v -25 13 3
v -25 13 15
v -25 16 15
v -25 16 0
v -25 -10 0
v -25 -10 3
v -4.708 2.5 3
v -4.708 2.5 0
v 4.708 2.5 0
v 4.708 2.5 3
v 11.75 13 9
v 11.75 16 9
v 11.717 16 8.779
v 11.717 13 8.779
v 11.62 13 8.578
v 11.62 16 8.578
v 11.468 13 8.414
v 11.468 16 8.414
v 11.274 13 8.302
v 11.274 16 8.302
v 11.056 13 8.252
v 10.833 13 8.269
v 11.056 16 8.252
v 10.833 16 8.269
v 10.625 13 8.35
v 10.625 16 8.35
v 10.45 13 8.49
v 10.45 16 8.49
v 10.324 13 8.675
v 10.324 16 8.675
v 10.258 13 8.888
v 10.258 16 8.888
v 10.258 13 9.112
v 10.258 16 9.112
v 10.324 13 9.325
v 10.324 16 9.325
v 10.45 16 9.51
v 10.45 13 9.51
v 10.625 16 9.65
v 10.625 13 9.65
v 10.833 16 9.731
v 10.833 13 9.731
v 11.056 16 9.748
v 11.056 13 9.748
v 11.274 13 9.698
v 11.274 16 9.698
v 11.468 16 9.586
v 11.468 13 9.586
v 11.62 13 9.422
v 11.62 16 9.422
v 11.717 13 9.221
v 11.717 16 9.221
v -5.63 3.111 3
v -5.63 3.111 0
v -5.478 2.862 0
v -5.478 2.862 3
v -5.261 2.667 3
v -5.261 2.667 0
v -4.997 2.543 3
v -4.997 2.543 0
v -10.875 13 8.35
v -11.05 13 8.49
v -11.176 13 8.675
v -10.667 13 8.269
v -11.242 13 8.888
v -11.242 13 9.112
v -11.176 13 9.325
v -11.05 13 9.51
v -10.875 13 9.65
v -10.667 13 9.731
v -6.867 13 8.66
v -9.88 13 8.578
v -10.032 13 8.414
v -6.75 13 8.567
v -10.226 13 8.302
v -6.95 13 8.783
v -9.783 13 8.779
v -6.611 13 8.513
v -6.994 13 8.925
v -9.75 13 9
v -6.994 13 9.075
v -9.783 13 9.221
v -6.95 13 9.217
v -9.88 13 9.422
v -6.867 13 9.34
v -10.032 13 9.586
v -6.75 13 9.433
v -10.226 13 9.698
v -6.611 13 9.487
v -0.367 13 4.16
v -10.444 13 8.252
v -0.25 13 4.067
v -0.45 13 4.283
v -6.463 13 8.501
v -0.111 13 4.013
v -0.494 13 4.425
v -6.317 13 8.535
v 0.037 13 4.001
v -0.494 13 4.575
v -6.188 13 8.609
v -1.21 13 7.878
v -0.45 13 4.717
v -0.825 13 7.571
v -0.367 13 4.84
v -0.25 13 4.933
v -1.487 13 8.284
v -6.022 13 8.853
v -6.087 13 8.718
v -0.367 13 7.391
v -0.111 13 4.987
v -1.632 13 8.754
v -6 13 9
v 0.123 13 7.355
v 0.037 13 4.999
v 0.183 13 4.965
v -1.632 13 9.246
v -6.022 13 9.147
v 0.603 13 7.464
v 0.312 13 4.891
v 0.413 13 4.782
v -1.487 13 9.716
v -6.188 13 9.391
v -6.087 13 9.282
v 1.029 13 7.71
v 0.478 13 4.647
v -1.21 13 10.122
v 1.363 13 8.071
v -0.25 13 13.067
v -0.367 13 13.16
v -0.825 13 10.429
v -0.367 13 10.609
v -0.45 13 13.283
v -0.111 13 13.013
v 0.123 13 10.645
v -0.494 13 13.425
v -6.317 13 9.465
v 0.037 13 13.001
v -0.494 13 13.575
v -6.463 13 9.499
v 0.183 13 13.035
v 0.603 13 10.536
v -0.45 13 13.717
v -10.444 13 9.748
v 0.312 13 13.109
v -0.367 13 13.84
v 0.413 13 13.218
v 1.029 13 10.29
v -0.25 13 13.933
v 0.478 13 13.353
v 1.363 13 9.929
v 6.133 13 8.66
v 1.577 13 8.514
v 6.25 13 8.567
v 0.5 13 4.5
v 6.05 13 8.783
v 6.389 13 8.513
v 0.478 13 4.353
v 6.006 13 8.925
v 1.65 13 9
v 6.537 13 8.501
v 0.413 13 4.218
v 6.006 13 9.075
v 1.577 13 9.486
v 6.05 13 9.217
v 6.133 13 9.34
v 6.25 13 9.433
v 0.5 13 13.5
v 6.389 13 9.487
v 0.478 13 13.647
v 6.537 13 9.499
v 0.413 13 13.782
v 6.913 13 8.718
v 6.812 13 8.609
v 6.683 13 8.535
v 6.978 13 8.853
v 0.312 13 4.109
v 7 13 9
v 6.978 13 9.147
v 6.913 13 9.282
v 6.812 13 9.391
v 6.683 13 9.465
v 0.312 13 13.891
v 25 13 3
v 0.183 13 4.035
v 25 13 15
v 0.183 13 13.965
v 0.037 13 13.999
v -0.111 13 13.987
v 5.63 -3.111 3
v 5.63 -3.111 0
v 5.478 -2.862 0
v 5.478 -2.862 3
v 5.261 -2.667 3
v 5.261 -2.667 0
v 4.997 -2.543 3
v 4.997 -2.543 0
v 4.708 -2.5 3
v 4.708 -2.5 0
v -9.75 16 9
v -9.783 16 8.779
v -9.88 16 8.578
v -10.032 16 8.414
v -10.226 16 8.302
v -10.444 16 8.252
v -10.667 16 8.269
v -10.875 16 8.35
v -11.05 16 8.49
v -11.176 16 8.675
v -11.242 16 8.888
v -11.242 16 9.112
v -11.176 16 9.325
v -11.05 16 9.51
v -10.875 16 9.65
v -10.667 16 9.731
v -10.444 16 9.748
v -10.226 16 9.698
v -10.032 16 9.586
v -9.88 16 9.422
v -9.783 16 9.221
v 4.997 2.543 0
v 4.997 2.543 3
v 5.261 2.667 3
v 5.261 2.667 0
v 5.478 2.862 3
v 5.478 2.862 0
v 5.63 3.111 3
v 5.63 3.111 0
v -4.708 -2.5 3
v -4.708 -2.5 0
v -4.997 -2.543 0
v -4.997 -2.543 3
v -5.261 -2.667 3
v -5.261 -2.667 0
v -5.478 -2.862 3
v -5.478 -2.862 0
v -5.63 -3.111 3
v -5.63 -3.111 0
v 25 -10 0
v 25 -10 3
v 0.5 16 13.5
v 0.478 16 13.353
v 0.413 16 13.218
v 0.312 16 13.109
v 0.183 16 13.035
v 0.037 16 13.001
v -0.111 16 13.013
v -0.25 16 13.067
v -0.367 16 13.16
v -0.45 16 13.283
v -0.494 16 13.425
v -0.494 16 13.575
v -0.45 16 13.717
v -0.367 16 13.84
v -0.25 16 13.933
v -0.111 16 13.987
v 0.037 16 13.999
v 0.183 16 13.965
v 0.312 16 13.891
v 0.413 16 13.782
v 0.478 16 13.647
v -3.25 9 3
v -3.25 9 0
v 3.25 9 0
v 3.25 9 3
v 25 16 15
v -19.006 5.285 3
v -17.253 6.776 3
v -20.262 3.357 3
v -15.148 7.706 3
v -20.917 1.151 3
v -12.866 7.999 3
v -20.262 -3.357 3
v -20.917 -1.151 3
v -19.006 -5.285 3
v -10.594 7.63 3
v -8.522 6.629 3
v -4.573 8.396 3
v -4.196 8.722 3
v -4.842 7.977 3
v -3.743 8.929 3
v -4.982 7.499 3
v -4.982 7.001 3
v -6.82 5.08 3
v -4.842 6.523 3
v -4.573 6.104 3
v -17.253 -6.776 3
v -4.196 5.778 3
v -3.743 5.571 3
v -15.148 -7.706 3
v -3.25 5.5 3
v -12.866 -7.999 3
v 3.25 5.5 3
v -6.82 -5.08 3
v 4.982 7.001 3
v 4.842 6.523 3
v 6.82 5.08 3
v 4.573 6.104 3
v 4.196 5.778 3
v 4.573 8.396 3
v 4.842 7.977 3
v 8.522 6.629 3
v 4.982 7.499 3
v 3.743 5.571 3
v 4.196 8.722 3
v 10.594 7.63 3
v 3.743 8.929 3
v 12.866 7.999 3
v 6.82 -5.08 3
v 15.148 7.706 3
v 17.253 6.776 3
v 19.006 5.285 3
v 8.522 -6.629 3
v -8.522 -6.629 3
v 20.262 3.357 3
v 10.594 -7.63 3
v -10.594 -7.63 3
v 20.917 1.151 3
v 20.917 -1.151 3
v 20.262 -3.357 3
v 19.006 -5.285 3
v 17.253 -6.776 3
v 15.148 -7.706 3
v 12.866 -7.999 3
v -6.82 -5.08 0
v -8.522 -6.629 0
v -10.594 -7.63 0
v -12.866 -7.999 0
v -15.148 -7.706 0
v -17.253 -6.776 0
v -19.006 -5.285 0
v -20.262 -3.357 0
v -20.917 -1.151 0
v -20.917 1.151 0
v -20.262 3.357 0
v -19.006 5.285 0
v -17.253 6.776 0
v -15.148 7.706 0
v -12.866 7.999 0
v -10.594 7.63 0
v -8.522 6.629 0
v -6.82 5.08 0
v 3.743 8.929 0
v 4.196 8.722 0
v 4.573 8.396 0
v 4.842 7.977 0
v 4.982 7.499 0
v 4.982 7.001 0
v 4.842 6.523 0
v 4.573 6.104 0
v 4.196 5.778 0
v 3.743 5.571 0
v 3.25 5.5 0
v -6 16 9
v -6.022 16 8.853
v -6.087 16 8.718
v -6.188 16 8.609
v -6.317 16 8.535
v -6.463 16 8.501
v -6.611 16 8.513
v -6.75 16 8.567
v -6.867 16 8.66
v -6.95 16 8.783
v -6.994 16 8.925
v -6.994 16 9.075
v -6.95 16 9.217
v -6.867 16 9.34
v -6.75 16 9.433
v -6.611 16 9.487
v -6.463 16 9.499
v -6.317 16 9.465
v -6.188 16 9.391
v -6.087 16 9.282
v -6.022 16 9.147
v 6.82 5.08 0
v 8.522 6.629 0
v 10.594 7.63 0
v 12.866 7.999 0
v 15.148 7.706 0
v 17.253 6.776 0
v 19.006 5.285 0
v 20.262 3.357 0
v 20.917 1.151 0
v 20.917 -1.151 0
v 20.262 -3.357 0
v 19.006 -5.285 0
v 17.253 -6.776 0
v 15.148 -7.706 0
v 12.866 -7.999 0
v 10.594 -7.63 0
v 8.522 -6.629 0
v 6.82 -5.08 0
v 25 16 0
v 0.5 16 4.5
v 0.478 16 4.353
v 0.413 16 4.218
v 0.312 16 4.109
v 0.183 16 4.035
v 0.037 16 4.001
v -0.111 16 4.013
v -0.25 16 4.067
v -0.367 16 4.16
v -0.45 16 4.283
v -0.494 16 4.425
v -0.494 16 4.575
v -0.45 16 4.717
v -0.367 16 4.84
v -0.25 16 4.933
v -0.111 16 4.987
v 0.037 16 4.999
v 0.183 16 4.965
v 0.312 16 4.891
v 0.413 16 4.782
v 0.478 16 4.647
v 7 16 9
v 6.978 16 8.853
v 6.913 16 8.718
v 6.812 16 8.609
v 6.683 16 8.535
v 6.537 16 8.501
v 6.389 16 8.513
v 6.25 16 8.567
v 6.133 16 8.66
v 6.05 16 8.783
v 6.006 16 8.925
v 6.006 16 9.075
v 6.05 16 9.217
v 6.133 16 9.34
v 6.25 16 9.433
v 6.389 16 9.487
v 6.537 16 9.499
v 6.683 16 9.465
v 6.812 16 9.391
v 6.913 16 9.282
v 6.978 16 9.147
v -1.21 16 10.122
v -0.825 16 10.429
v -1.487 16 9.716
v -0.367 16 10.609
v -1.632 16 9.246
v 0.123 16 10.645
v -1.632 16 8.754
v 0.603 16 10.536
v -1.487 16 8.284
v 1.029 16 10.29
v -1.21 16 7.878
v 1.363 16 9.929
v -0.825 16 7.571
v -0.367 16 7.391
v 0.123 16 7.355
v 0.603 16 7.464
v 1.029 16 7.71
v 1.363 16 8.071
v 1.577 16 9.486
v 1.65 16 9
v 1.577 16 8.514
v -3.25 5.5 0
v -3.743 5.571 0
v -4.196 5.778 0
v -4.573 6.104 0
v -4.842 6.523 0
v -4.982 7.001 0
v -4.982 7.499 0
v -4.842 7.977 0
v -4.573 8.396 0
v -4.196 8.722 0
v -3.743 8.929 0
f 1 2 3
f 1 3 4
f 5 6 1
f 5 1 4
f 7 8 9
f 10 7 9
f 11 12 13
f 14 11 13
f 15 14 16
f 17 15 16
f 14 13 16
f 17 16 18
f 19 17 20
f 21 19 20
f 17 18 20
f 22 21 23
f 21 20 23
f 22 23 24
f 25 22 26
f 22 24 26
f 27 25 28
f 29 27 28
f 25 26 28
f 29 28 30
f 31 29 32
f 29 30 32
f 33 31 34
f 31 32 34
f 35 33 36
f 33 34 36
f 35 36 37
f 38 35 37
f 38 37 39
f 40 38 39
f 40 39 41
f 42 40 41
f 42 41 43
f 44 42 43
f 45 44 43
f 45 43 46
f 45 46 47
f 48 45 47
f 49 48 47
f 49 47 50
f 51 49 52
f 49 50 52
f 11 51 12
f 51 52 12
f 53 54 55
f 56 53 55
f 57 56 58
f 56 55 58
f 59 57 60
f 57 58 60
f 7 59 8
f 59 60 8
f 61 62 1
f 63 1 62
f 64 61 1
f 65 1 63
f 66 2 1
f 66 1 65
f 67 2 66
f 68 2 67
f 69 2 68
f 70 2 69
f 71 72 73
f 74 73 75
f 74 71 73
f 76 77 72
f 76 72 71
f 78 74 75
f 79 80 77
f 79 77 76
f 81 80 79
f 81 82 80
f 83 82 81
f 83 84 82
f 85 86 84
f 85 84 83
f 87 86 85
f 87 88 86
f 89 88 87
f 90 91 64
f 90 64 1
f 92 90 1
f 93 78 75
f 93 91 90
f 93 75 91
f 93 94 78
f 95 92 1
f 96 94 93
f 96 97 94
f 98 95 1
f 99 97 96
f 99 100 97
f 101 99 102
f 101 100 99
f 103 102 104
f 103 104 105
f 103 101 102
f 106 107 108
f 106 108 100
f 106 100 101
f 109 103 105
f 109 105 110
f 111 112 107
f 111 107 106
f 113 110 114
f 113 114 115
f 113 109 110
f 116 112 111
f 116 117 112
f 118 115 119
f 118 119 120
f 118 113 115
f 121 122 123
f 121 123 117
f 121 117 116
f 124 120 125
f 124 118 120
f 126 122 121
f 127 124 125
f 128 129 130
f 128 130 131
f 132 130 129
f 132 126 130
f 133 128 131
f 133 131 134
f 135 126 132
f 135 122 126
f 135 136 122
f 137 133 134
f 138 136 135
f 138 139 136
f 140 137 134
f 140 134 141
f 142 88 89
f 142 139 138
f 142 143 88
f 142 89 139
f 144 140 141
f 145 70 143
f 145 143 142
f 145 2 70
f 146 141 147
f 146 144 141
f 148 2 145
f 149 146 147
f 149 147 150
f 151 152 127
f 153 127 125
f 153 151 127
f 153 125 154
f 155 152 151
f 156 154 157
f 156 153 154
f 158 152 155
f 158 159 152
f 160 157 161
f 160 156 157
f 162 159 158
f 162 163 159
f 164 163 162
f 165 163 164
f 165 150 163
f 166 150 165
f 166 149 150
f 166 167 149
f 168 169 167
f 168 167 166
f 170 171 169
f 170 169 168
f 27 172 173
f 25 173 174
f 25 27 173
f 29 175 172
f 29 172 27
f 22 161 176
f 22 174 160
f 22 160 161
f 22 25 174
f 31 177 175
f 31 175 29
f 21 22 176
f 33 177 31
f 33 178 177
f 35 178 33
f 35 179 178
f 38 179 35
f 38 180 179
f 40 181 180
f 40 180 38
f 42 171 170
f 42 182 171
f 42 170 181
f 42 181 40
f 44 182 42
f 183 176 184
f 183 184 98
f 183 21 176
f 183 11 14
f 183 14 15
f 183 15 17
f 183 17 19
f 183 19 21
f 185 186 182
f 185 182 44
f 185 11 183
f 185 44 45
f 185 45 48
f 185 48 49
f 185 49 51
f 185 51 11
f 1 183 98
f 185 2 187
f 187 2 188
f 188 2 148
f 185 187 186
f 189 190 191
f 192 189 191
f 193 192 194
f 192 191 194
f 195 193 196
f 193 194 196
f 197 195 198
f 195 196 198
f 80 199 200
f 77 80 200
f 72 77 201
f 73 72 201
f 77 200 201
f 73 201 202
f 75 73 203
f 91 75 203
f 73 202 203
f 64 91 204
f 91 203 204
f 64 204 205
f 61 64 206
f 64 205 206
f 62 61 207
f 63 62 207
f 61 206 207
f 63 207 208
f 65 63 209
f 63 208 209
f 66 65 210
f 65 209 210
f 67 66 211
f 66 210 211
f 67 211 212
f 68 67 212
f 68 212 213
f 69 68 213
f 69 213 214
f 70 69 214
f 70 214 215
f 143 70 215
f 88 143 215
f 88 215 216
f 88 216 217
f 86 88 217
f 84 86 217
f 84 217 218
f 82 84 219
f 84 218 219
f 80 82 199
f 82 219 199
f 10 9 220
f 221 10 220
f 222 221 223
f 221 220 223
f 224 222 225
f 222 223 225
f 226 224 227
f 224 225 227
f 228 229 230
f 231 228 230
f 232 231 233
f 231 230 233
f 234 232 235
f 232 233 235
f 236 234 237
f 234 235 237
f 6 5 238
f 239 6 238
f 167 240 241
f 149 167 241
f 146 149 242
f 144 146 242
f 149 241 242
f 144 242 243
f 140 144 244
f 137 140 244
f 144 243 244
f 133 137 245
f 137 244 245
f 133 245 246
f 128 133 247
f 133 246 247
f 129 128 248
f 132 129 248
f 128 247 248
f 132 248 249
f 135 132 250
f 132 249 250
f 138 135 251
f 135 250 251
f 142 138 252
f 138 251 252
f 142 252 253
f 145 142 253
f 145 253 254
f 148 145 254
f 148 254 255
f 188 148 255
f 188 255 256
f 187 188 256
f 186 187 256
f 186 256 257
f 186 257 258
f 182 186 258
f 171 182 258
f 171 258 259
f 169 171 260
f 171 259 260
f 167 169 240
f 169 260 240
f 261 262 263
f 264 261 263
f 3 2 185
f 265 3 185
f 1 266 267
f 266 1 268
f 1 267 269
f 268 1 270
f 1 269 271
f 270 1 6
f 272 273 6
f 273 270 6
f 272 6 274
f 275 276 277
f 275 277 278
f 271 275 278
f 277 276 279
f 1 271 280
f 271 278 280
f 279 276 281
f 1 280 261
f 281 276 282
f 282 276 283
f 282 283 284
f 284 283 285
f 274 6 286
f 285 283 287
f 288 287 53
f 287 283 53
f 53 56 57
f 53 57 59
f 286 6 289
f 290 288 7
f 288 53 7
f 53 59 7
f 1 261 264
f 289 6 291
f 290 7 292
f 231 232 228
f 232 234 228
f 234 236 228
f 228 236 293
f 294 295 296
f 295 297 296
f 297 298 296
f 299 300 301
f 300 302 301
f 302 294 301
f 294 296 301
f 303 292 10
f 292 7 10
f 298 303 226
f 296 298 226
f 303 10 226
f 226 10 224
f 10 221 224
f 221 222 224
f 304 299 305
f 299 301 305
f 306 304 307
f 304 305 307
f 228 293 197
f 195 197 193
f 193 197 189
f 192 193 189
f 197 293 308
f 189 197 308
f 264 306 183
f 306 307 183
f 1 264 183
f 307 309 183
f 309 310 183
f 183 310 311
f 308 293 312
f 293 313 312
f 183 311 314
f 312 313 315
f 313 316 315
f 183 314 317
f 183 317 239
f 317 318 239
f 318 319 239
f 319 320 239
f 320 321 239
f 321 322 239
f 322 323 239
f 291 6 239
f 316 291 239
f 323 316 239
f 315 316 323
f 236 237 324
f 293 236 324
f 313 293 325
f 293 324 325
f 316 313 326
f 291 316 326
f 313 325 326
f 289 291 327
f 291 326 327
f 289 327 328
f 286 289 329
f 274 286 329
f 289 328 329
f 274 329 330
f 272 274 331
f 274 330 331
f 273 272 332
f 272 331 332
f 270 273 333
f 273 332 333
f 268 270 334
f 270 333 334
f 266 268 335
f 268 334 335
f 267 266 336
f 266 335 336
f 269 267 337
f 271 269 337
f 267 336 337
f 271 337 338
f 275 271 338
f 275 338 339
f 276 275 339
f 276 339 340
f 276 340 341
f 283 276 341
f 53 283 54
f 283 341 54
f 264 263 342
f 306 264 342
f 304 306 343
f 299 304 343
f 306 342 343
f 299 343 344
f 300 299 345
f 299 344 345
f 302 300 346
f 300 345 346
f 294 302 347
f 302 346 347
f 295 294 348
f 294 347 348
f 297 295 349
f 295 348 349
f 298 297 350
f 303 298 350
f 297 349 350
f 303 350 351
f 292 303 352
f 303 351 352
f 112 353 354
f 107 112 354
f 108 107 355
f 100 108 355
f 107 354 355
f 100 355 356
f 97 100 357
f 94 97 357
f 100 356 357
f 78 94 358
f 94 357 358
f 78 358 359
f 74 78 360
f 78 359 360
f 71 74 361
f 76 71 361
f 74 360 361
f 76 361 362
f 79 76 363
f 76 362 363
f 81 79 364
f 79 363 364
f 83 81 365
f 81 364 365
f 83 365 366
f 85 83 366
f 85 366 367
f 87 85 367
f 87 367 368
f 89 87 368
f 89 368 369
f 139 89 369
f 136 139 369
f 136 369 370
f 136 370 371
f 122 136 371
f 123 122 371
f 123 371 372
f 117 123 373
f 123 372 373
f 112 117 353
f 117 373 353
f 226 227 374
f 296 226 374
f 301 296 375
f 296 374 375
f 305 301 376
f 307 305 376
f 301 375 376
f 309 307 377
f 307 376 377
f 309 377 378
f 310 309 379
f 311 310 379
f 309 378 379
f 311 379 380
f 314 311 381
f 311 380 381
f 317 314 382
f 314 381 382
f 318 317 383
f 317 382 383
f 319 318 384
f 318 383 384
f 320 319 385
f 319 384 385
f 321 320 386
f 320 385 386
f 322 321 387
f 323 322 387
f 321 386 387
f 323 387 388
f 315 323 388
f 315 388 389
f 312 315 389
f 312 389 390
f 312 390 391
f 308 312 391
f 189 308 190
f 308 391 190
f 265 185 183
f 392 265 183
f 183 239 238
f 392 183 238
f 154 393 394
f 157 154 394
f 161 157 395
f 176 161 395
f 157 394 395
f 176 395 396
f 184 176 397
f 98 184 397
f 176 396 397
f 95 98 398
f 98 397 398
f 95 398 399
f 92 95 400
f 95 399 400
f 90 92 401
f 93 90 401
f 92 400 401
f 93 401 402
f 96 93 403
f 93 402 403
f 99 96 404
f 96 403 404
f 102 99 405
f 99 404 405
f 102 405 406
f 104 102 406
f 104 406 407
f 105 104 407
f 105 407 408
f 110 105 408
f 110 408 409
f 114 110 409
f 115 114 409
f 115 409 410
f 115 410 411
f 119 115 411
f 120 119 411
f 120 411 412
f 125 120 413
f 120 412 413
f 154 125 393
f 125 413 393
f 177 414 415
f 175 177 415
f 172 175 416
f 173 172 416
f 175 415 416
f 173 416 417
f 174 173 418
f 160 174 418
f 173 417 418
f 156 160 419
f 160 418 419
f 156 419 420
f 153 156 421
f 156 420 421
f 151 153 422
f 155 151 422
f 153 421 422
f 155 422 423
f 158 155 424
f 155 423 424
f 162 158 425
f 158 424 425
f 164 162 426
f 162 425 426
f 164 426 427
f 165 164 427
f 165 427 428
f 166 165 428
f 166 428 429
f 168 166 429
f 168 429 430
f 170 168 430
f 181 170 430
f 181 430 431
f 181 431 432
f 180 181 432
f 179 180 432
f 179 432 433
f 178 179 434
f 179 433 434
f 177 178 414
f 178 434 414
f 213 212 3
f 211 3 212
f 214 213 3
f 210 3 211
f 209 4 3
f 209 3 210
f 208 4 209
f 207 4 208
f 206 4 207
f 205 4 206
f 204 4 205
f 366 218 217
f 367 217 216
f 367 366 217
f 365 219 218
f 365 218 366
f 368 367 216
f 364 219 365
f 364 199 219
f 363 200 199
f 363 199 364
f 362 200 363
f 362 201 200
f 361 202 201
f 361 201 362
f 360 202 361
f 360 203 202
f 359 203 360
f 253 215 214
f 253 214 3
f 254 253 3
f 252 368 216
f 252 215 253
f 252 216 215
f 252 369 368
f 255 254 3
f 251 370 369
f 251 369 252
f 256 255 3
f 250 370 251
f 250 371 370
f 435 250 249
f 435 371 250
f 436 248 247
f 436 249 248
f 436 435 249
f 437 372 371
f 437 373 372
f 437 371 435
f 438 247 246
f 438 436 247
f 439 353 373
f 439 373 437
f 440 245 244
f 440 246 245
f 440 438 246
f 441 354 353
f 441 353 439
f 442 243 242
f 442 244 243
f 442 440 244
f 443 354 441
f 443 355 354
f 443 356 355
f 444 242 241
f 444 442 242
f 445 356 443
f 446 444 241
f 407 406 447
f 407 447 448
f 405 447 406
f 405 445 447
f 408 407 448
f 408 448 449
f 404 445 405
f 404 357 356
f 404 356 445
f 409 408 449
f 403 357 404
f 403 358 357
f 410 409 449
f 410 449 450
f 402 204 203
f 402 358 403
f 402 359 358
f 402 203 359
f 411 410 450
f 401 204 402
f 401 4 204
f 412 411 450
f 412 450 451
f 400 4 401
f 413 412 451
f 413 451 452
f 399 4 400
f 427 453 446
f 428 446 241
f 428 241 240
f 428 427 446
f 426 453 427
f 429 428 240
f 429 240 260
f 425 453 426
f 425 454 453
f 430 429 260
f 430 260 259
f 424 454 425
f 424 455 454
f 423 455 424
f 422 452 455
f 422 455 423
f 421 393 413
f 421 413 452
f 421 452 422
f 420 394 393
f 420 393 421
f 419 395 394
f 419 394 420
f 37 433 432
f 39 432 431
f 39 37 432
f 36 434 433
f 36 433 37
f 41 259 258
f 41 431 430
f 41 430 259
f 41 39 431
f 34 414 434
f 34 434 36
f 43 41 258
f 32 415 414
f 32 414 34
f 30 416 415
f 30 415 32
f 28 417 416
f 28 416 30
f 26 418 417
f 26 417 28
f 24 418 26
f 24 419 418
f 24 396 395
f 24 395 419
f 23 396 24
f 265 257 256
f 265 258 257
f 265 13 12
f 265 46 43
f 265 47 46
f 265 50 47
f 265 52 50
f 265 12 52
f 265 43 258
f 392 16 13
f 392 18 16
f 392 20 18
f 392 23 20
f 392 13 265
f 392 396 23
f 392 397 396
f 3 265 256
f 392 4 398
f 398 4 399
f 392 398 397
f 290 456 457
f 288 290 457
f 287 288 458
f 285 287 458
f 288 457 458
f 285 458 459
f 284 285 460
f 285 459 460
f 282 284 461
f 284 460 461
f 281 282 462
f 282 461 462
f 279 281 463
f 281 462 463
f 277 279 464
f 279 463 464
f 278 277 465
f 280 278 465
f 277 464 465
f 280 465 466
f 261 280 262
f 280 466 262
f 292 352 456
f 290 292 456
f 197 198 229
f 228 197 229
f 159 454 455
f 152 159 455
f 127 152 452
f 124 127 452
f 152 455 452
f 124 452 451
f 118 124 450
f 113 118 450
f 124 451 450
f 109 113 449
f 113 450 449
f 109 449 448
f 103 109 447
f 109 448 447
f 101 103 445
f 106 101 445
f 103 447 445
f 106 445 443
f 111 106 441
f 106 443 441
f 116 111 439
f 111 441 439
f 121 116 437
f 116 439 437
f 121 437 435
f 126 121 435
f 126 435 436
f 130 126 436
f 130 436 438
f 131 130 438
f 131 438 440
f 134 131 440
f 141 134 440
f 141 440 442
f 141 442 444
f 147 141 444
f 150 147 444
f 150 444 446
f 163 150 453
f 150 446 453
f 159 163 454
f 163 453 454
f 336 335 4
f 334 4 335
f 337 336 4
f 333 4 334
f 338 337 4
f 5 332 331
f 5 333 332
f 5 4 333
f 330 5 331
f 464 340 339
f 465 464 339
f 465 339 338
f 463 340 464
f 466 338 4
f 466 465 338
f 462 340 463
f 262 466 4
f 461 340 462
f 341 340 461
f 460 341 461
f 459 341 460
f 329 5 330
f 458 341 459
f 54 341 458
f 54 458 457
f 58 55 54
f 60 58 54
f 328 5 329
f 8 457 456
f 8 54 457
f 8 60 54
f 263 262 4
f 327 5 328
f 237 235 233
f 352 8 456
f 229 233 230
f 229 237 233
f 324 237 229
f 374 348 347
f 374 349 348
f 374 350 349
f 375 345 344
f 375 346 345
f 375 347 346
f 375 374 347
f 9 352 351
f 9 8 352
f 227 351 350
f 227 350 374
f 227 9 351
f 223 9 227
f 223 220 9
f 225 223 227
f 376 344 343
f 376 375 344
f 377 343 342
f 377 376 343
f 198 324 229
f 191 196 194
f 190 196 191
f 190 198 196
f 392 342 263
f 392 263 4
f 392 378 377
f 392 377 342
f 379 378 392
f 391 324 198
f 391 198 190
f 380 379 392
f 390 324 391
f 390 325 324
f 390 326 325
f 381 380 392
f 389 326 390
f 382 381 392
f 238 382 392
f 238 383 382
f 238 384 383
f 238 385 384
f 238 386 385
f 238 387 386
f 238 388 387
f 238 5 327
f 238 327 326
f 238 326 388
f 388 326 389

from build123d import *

# Parameters (mm, degrees)
SKETCH_1_W          = 50
SKETCH_1_H          = 20
EXTRUDE_1_DEPTH     = 3
SKETCH_2_W          = 50
SKETCH_2_H          = 15
EXTRUDE_2_DEPTH     = 6
SKETCH_5_W          = 50
SKETCH_5_H          = 12
CUT_EXTRUDE_2_DEPTH = 3
SKETCH_4_R          = 1.65
SKETCH_4_R_2        = 0.5
SKETCH_4_R_3        = 0.75
CUT_EXTRUDE_1_DEPTH = 3


with BuildPart() as part:
    # 草图1 → 凸台-拉伸1 (new body)
    with BuildSketch(Plane.XY):
        Rectangle(SKETCH_1_W, SKETCH_1_H)
        with BuildLine():
            Line((-4.708438024, 2.5), (4.708438024, 2.5))
            ThreePointArc((4.708438024, 2.5), (5.261208823, 2.666666667), (5.629722688, 3.111111111))
            ThreePointArc((5.629722688, 3.111111111), (21, 0), (5.629722688, -3.111111111))
            ThreePointArc((5.629722688, -3.111111111), (5.261208823, -2.666666667), (4.708438024, -2.5))
            Line((4.708438024, -2.5), (-4.708438024, -2.5))
            ThreePointArc((-4.708438024, -2.5), (-5.261208823, -2.666666667), (-5.629722688, -3.111111111))
            ThreePointArc((-5.629722688, -3.111111111), (-21, 0), (-5.629722688, 3.111111111))
            ThreePointArc((-5.629722688, 3.111111111), (-5.261208823, 2.666666667), (-4.708438024, 2.5))
        make_face(mode=Mode.SUBTRACT)
        with BuildLine():
            Line((3.25, 5.5), (-3.25, 5.5))
            ThreePointArc((-3.25, 5.5), (-5, 7.25), (-3.25, 9))
            Line((-3.25, 9), (3.25, 9))
            ThreePointArc((3.25, 9), (5, 7.25), (3.25, 5.5))
        make_face(mode=Mode.SUBTRACT)
    extrude(amount=EXTRUDE_1_DEPTH)

    # 草图2 → 凸台-拉伸2 (add)
    with BuildSketch(Plane(origin=(0, 10, 0), x_dir=(1, 0, 0), z_dir=(0, 1, 0))):
        with Locations((0, -7.5)):
            Rectangle(SKETCH_2_W, SKETCH_2_H)
    extrude(amount=EXTRUDE_2_DEPTH)

    # 草图5 → 切除-拉伸2 (cut)
    with BuildSketch(Plane.XZ.offset(-10)):
        with Locations((0, 9)):
            Rectangle(SKETCH_5_W, SKETCH_5_H)
    extrude(amount=-CUT_EXTRUDE_2_DEPTH, mode=Mode.SUBTRACT)

    # 草图4 → 切除-拉伸1 (cut)
    with BuildSketch(Plane(origin=(0, 16, 0), x_dir=(1, 0, 0), z_dir=(0, 1, 0))):
        with Locations((0, -9)):
            Circle(SKETCH_4_R)
        with Locations((6.5, -9)):
            Circle(SKETCH_4_R_2)
        with Locations((-6.5, -9)):
            Circle(SKETCH_4_R_2)
        with Locations((11, -9)):
            Circle(SKETCH_4_R_3)
        with Locations((-10.5, -9)):
            Circle(SKETCH_4_R_3)
        with Locations((0, -4.5)):
            Circle(SKETCH_4_R_2)
        with Locations((0, -13.5)):
            Circle(SKETCH_4_R_2)
    extrude(amount=-CUT_EXTRUDE_1_DEPTH, mode=Mode.SUBTRACT)


solid = part.part
